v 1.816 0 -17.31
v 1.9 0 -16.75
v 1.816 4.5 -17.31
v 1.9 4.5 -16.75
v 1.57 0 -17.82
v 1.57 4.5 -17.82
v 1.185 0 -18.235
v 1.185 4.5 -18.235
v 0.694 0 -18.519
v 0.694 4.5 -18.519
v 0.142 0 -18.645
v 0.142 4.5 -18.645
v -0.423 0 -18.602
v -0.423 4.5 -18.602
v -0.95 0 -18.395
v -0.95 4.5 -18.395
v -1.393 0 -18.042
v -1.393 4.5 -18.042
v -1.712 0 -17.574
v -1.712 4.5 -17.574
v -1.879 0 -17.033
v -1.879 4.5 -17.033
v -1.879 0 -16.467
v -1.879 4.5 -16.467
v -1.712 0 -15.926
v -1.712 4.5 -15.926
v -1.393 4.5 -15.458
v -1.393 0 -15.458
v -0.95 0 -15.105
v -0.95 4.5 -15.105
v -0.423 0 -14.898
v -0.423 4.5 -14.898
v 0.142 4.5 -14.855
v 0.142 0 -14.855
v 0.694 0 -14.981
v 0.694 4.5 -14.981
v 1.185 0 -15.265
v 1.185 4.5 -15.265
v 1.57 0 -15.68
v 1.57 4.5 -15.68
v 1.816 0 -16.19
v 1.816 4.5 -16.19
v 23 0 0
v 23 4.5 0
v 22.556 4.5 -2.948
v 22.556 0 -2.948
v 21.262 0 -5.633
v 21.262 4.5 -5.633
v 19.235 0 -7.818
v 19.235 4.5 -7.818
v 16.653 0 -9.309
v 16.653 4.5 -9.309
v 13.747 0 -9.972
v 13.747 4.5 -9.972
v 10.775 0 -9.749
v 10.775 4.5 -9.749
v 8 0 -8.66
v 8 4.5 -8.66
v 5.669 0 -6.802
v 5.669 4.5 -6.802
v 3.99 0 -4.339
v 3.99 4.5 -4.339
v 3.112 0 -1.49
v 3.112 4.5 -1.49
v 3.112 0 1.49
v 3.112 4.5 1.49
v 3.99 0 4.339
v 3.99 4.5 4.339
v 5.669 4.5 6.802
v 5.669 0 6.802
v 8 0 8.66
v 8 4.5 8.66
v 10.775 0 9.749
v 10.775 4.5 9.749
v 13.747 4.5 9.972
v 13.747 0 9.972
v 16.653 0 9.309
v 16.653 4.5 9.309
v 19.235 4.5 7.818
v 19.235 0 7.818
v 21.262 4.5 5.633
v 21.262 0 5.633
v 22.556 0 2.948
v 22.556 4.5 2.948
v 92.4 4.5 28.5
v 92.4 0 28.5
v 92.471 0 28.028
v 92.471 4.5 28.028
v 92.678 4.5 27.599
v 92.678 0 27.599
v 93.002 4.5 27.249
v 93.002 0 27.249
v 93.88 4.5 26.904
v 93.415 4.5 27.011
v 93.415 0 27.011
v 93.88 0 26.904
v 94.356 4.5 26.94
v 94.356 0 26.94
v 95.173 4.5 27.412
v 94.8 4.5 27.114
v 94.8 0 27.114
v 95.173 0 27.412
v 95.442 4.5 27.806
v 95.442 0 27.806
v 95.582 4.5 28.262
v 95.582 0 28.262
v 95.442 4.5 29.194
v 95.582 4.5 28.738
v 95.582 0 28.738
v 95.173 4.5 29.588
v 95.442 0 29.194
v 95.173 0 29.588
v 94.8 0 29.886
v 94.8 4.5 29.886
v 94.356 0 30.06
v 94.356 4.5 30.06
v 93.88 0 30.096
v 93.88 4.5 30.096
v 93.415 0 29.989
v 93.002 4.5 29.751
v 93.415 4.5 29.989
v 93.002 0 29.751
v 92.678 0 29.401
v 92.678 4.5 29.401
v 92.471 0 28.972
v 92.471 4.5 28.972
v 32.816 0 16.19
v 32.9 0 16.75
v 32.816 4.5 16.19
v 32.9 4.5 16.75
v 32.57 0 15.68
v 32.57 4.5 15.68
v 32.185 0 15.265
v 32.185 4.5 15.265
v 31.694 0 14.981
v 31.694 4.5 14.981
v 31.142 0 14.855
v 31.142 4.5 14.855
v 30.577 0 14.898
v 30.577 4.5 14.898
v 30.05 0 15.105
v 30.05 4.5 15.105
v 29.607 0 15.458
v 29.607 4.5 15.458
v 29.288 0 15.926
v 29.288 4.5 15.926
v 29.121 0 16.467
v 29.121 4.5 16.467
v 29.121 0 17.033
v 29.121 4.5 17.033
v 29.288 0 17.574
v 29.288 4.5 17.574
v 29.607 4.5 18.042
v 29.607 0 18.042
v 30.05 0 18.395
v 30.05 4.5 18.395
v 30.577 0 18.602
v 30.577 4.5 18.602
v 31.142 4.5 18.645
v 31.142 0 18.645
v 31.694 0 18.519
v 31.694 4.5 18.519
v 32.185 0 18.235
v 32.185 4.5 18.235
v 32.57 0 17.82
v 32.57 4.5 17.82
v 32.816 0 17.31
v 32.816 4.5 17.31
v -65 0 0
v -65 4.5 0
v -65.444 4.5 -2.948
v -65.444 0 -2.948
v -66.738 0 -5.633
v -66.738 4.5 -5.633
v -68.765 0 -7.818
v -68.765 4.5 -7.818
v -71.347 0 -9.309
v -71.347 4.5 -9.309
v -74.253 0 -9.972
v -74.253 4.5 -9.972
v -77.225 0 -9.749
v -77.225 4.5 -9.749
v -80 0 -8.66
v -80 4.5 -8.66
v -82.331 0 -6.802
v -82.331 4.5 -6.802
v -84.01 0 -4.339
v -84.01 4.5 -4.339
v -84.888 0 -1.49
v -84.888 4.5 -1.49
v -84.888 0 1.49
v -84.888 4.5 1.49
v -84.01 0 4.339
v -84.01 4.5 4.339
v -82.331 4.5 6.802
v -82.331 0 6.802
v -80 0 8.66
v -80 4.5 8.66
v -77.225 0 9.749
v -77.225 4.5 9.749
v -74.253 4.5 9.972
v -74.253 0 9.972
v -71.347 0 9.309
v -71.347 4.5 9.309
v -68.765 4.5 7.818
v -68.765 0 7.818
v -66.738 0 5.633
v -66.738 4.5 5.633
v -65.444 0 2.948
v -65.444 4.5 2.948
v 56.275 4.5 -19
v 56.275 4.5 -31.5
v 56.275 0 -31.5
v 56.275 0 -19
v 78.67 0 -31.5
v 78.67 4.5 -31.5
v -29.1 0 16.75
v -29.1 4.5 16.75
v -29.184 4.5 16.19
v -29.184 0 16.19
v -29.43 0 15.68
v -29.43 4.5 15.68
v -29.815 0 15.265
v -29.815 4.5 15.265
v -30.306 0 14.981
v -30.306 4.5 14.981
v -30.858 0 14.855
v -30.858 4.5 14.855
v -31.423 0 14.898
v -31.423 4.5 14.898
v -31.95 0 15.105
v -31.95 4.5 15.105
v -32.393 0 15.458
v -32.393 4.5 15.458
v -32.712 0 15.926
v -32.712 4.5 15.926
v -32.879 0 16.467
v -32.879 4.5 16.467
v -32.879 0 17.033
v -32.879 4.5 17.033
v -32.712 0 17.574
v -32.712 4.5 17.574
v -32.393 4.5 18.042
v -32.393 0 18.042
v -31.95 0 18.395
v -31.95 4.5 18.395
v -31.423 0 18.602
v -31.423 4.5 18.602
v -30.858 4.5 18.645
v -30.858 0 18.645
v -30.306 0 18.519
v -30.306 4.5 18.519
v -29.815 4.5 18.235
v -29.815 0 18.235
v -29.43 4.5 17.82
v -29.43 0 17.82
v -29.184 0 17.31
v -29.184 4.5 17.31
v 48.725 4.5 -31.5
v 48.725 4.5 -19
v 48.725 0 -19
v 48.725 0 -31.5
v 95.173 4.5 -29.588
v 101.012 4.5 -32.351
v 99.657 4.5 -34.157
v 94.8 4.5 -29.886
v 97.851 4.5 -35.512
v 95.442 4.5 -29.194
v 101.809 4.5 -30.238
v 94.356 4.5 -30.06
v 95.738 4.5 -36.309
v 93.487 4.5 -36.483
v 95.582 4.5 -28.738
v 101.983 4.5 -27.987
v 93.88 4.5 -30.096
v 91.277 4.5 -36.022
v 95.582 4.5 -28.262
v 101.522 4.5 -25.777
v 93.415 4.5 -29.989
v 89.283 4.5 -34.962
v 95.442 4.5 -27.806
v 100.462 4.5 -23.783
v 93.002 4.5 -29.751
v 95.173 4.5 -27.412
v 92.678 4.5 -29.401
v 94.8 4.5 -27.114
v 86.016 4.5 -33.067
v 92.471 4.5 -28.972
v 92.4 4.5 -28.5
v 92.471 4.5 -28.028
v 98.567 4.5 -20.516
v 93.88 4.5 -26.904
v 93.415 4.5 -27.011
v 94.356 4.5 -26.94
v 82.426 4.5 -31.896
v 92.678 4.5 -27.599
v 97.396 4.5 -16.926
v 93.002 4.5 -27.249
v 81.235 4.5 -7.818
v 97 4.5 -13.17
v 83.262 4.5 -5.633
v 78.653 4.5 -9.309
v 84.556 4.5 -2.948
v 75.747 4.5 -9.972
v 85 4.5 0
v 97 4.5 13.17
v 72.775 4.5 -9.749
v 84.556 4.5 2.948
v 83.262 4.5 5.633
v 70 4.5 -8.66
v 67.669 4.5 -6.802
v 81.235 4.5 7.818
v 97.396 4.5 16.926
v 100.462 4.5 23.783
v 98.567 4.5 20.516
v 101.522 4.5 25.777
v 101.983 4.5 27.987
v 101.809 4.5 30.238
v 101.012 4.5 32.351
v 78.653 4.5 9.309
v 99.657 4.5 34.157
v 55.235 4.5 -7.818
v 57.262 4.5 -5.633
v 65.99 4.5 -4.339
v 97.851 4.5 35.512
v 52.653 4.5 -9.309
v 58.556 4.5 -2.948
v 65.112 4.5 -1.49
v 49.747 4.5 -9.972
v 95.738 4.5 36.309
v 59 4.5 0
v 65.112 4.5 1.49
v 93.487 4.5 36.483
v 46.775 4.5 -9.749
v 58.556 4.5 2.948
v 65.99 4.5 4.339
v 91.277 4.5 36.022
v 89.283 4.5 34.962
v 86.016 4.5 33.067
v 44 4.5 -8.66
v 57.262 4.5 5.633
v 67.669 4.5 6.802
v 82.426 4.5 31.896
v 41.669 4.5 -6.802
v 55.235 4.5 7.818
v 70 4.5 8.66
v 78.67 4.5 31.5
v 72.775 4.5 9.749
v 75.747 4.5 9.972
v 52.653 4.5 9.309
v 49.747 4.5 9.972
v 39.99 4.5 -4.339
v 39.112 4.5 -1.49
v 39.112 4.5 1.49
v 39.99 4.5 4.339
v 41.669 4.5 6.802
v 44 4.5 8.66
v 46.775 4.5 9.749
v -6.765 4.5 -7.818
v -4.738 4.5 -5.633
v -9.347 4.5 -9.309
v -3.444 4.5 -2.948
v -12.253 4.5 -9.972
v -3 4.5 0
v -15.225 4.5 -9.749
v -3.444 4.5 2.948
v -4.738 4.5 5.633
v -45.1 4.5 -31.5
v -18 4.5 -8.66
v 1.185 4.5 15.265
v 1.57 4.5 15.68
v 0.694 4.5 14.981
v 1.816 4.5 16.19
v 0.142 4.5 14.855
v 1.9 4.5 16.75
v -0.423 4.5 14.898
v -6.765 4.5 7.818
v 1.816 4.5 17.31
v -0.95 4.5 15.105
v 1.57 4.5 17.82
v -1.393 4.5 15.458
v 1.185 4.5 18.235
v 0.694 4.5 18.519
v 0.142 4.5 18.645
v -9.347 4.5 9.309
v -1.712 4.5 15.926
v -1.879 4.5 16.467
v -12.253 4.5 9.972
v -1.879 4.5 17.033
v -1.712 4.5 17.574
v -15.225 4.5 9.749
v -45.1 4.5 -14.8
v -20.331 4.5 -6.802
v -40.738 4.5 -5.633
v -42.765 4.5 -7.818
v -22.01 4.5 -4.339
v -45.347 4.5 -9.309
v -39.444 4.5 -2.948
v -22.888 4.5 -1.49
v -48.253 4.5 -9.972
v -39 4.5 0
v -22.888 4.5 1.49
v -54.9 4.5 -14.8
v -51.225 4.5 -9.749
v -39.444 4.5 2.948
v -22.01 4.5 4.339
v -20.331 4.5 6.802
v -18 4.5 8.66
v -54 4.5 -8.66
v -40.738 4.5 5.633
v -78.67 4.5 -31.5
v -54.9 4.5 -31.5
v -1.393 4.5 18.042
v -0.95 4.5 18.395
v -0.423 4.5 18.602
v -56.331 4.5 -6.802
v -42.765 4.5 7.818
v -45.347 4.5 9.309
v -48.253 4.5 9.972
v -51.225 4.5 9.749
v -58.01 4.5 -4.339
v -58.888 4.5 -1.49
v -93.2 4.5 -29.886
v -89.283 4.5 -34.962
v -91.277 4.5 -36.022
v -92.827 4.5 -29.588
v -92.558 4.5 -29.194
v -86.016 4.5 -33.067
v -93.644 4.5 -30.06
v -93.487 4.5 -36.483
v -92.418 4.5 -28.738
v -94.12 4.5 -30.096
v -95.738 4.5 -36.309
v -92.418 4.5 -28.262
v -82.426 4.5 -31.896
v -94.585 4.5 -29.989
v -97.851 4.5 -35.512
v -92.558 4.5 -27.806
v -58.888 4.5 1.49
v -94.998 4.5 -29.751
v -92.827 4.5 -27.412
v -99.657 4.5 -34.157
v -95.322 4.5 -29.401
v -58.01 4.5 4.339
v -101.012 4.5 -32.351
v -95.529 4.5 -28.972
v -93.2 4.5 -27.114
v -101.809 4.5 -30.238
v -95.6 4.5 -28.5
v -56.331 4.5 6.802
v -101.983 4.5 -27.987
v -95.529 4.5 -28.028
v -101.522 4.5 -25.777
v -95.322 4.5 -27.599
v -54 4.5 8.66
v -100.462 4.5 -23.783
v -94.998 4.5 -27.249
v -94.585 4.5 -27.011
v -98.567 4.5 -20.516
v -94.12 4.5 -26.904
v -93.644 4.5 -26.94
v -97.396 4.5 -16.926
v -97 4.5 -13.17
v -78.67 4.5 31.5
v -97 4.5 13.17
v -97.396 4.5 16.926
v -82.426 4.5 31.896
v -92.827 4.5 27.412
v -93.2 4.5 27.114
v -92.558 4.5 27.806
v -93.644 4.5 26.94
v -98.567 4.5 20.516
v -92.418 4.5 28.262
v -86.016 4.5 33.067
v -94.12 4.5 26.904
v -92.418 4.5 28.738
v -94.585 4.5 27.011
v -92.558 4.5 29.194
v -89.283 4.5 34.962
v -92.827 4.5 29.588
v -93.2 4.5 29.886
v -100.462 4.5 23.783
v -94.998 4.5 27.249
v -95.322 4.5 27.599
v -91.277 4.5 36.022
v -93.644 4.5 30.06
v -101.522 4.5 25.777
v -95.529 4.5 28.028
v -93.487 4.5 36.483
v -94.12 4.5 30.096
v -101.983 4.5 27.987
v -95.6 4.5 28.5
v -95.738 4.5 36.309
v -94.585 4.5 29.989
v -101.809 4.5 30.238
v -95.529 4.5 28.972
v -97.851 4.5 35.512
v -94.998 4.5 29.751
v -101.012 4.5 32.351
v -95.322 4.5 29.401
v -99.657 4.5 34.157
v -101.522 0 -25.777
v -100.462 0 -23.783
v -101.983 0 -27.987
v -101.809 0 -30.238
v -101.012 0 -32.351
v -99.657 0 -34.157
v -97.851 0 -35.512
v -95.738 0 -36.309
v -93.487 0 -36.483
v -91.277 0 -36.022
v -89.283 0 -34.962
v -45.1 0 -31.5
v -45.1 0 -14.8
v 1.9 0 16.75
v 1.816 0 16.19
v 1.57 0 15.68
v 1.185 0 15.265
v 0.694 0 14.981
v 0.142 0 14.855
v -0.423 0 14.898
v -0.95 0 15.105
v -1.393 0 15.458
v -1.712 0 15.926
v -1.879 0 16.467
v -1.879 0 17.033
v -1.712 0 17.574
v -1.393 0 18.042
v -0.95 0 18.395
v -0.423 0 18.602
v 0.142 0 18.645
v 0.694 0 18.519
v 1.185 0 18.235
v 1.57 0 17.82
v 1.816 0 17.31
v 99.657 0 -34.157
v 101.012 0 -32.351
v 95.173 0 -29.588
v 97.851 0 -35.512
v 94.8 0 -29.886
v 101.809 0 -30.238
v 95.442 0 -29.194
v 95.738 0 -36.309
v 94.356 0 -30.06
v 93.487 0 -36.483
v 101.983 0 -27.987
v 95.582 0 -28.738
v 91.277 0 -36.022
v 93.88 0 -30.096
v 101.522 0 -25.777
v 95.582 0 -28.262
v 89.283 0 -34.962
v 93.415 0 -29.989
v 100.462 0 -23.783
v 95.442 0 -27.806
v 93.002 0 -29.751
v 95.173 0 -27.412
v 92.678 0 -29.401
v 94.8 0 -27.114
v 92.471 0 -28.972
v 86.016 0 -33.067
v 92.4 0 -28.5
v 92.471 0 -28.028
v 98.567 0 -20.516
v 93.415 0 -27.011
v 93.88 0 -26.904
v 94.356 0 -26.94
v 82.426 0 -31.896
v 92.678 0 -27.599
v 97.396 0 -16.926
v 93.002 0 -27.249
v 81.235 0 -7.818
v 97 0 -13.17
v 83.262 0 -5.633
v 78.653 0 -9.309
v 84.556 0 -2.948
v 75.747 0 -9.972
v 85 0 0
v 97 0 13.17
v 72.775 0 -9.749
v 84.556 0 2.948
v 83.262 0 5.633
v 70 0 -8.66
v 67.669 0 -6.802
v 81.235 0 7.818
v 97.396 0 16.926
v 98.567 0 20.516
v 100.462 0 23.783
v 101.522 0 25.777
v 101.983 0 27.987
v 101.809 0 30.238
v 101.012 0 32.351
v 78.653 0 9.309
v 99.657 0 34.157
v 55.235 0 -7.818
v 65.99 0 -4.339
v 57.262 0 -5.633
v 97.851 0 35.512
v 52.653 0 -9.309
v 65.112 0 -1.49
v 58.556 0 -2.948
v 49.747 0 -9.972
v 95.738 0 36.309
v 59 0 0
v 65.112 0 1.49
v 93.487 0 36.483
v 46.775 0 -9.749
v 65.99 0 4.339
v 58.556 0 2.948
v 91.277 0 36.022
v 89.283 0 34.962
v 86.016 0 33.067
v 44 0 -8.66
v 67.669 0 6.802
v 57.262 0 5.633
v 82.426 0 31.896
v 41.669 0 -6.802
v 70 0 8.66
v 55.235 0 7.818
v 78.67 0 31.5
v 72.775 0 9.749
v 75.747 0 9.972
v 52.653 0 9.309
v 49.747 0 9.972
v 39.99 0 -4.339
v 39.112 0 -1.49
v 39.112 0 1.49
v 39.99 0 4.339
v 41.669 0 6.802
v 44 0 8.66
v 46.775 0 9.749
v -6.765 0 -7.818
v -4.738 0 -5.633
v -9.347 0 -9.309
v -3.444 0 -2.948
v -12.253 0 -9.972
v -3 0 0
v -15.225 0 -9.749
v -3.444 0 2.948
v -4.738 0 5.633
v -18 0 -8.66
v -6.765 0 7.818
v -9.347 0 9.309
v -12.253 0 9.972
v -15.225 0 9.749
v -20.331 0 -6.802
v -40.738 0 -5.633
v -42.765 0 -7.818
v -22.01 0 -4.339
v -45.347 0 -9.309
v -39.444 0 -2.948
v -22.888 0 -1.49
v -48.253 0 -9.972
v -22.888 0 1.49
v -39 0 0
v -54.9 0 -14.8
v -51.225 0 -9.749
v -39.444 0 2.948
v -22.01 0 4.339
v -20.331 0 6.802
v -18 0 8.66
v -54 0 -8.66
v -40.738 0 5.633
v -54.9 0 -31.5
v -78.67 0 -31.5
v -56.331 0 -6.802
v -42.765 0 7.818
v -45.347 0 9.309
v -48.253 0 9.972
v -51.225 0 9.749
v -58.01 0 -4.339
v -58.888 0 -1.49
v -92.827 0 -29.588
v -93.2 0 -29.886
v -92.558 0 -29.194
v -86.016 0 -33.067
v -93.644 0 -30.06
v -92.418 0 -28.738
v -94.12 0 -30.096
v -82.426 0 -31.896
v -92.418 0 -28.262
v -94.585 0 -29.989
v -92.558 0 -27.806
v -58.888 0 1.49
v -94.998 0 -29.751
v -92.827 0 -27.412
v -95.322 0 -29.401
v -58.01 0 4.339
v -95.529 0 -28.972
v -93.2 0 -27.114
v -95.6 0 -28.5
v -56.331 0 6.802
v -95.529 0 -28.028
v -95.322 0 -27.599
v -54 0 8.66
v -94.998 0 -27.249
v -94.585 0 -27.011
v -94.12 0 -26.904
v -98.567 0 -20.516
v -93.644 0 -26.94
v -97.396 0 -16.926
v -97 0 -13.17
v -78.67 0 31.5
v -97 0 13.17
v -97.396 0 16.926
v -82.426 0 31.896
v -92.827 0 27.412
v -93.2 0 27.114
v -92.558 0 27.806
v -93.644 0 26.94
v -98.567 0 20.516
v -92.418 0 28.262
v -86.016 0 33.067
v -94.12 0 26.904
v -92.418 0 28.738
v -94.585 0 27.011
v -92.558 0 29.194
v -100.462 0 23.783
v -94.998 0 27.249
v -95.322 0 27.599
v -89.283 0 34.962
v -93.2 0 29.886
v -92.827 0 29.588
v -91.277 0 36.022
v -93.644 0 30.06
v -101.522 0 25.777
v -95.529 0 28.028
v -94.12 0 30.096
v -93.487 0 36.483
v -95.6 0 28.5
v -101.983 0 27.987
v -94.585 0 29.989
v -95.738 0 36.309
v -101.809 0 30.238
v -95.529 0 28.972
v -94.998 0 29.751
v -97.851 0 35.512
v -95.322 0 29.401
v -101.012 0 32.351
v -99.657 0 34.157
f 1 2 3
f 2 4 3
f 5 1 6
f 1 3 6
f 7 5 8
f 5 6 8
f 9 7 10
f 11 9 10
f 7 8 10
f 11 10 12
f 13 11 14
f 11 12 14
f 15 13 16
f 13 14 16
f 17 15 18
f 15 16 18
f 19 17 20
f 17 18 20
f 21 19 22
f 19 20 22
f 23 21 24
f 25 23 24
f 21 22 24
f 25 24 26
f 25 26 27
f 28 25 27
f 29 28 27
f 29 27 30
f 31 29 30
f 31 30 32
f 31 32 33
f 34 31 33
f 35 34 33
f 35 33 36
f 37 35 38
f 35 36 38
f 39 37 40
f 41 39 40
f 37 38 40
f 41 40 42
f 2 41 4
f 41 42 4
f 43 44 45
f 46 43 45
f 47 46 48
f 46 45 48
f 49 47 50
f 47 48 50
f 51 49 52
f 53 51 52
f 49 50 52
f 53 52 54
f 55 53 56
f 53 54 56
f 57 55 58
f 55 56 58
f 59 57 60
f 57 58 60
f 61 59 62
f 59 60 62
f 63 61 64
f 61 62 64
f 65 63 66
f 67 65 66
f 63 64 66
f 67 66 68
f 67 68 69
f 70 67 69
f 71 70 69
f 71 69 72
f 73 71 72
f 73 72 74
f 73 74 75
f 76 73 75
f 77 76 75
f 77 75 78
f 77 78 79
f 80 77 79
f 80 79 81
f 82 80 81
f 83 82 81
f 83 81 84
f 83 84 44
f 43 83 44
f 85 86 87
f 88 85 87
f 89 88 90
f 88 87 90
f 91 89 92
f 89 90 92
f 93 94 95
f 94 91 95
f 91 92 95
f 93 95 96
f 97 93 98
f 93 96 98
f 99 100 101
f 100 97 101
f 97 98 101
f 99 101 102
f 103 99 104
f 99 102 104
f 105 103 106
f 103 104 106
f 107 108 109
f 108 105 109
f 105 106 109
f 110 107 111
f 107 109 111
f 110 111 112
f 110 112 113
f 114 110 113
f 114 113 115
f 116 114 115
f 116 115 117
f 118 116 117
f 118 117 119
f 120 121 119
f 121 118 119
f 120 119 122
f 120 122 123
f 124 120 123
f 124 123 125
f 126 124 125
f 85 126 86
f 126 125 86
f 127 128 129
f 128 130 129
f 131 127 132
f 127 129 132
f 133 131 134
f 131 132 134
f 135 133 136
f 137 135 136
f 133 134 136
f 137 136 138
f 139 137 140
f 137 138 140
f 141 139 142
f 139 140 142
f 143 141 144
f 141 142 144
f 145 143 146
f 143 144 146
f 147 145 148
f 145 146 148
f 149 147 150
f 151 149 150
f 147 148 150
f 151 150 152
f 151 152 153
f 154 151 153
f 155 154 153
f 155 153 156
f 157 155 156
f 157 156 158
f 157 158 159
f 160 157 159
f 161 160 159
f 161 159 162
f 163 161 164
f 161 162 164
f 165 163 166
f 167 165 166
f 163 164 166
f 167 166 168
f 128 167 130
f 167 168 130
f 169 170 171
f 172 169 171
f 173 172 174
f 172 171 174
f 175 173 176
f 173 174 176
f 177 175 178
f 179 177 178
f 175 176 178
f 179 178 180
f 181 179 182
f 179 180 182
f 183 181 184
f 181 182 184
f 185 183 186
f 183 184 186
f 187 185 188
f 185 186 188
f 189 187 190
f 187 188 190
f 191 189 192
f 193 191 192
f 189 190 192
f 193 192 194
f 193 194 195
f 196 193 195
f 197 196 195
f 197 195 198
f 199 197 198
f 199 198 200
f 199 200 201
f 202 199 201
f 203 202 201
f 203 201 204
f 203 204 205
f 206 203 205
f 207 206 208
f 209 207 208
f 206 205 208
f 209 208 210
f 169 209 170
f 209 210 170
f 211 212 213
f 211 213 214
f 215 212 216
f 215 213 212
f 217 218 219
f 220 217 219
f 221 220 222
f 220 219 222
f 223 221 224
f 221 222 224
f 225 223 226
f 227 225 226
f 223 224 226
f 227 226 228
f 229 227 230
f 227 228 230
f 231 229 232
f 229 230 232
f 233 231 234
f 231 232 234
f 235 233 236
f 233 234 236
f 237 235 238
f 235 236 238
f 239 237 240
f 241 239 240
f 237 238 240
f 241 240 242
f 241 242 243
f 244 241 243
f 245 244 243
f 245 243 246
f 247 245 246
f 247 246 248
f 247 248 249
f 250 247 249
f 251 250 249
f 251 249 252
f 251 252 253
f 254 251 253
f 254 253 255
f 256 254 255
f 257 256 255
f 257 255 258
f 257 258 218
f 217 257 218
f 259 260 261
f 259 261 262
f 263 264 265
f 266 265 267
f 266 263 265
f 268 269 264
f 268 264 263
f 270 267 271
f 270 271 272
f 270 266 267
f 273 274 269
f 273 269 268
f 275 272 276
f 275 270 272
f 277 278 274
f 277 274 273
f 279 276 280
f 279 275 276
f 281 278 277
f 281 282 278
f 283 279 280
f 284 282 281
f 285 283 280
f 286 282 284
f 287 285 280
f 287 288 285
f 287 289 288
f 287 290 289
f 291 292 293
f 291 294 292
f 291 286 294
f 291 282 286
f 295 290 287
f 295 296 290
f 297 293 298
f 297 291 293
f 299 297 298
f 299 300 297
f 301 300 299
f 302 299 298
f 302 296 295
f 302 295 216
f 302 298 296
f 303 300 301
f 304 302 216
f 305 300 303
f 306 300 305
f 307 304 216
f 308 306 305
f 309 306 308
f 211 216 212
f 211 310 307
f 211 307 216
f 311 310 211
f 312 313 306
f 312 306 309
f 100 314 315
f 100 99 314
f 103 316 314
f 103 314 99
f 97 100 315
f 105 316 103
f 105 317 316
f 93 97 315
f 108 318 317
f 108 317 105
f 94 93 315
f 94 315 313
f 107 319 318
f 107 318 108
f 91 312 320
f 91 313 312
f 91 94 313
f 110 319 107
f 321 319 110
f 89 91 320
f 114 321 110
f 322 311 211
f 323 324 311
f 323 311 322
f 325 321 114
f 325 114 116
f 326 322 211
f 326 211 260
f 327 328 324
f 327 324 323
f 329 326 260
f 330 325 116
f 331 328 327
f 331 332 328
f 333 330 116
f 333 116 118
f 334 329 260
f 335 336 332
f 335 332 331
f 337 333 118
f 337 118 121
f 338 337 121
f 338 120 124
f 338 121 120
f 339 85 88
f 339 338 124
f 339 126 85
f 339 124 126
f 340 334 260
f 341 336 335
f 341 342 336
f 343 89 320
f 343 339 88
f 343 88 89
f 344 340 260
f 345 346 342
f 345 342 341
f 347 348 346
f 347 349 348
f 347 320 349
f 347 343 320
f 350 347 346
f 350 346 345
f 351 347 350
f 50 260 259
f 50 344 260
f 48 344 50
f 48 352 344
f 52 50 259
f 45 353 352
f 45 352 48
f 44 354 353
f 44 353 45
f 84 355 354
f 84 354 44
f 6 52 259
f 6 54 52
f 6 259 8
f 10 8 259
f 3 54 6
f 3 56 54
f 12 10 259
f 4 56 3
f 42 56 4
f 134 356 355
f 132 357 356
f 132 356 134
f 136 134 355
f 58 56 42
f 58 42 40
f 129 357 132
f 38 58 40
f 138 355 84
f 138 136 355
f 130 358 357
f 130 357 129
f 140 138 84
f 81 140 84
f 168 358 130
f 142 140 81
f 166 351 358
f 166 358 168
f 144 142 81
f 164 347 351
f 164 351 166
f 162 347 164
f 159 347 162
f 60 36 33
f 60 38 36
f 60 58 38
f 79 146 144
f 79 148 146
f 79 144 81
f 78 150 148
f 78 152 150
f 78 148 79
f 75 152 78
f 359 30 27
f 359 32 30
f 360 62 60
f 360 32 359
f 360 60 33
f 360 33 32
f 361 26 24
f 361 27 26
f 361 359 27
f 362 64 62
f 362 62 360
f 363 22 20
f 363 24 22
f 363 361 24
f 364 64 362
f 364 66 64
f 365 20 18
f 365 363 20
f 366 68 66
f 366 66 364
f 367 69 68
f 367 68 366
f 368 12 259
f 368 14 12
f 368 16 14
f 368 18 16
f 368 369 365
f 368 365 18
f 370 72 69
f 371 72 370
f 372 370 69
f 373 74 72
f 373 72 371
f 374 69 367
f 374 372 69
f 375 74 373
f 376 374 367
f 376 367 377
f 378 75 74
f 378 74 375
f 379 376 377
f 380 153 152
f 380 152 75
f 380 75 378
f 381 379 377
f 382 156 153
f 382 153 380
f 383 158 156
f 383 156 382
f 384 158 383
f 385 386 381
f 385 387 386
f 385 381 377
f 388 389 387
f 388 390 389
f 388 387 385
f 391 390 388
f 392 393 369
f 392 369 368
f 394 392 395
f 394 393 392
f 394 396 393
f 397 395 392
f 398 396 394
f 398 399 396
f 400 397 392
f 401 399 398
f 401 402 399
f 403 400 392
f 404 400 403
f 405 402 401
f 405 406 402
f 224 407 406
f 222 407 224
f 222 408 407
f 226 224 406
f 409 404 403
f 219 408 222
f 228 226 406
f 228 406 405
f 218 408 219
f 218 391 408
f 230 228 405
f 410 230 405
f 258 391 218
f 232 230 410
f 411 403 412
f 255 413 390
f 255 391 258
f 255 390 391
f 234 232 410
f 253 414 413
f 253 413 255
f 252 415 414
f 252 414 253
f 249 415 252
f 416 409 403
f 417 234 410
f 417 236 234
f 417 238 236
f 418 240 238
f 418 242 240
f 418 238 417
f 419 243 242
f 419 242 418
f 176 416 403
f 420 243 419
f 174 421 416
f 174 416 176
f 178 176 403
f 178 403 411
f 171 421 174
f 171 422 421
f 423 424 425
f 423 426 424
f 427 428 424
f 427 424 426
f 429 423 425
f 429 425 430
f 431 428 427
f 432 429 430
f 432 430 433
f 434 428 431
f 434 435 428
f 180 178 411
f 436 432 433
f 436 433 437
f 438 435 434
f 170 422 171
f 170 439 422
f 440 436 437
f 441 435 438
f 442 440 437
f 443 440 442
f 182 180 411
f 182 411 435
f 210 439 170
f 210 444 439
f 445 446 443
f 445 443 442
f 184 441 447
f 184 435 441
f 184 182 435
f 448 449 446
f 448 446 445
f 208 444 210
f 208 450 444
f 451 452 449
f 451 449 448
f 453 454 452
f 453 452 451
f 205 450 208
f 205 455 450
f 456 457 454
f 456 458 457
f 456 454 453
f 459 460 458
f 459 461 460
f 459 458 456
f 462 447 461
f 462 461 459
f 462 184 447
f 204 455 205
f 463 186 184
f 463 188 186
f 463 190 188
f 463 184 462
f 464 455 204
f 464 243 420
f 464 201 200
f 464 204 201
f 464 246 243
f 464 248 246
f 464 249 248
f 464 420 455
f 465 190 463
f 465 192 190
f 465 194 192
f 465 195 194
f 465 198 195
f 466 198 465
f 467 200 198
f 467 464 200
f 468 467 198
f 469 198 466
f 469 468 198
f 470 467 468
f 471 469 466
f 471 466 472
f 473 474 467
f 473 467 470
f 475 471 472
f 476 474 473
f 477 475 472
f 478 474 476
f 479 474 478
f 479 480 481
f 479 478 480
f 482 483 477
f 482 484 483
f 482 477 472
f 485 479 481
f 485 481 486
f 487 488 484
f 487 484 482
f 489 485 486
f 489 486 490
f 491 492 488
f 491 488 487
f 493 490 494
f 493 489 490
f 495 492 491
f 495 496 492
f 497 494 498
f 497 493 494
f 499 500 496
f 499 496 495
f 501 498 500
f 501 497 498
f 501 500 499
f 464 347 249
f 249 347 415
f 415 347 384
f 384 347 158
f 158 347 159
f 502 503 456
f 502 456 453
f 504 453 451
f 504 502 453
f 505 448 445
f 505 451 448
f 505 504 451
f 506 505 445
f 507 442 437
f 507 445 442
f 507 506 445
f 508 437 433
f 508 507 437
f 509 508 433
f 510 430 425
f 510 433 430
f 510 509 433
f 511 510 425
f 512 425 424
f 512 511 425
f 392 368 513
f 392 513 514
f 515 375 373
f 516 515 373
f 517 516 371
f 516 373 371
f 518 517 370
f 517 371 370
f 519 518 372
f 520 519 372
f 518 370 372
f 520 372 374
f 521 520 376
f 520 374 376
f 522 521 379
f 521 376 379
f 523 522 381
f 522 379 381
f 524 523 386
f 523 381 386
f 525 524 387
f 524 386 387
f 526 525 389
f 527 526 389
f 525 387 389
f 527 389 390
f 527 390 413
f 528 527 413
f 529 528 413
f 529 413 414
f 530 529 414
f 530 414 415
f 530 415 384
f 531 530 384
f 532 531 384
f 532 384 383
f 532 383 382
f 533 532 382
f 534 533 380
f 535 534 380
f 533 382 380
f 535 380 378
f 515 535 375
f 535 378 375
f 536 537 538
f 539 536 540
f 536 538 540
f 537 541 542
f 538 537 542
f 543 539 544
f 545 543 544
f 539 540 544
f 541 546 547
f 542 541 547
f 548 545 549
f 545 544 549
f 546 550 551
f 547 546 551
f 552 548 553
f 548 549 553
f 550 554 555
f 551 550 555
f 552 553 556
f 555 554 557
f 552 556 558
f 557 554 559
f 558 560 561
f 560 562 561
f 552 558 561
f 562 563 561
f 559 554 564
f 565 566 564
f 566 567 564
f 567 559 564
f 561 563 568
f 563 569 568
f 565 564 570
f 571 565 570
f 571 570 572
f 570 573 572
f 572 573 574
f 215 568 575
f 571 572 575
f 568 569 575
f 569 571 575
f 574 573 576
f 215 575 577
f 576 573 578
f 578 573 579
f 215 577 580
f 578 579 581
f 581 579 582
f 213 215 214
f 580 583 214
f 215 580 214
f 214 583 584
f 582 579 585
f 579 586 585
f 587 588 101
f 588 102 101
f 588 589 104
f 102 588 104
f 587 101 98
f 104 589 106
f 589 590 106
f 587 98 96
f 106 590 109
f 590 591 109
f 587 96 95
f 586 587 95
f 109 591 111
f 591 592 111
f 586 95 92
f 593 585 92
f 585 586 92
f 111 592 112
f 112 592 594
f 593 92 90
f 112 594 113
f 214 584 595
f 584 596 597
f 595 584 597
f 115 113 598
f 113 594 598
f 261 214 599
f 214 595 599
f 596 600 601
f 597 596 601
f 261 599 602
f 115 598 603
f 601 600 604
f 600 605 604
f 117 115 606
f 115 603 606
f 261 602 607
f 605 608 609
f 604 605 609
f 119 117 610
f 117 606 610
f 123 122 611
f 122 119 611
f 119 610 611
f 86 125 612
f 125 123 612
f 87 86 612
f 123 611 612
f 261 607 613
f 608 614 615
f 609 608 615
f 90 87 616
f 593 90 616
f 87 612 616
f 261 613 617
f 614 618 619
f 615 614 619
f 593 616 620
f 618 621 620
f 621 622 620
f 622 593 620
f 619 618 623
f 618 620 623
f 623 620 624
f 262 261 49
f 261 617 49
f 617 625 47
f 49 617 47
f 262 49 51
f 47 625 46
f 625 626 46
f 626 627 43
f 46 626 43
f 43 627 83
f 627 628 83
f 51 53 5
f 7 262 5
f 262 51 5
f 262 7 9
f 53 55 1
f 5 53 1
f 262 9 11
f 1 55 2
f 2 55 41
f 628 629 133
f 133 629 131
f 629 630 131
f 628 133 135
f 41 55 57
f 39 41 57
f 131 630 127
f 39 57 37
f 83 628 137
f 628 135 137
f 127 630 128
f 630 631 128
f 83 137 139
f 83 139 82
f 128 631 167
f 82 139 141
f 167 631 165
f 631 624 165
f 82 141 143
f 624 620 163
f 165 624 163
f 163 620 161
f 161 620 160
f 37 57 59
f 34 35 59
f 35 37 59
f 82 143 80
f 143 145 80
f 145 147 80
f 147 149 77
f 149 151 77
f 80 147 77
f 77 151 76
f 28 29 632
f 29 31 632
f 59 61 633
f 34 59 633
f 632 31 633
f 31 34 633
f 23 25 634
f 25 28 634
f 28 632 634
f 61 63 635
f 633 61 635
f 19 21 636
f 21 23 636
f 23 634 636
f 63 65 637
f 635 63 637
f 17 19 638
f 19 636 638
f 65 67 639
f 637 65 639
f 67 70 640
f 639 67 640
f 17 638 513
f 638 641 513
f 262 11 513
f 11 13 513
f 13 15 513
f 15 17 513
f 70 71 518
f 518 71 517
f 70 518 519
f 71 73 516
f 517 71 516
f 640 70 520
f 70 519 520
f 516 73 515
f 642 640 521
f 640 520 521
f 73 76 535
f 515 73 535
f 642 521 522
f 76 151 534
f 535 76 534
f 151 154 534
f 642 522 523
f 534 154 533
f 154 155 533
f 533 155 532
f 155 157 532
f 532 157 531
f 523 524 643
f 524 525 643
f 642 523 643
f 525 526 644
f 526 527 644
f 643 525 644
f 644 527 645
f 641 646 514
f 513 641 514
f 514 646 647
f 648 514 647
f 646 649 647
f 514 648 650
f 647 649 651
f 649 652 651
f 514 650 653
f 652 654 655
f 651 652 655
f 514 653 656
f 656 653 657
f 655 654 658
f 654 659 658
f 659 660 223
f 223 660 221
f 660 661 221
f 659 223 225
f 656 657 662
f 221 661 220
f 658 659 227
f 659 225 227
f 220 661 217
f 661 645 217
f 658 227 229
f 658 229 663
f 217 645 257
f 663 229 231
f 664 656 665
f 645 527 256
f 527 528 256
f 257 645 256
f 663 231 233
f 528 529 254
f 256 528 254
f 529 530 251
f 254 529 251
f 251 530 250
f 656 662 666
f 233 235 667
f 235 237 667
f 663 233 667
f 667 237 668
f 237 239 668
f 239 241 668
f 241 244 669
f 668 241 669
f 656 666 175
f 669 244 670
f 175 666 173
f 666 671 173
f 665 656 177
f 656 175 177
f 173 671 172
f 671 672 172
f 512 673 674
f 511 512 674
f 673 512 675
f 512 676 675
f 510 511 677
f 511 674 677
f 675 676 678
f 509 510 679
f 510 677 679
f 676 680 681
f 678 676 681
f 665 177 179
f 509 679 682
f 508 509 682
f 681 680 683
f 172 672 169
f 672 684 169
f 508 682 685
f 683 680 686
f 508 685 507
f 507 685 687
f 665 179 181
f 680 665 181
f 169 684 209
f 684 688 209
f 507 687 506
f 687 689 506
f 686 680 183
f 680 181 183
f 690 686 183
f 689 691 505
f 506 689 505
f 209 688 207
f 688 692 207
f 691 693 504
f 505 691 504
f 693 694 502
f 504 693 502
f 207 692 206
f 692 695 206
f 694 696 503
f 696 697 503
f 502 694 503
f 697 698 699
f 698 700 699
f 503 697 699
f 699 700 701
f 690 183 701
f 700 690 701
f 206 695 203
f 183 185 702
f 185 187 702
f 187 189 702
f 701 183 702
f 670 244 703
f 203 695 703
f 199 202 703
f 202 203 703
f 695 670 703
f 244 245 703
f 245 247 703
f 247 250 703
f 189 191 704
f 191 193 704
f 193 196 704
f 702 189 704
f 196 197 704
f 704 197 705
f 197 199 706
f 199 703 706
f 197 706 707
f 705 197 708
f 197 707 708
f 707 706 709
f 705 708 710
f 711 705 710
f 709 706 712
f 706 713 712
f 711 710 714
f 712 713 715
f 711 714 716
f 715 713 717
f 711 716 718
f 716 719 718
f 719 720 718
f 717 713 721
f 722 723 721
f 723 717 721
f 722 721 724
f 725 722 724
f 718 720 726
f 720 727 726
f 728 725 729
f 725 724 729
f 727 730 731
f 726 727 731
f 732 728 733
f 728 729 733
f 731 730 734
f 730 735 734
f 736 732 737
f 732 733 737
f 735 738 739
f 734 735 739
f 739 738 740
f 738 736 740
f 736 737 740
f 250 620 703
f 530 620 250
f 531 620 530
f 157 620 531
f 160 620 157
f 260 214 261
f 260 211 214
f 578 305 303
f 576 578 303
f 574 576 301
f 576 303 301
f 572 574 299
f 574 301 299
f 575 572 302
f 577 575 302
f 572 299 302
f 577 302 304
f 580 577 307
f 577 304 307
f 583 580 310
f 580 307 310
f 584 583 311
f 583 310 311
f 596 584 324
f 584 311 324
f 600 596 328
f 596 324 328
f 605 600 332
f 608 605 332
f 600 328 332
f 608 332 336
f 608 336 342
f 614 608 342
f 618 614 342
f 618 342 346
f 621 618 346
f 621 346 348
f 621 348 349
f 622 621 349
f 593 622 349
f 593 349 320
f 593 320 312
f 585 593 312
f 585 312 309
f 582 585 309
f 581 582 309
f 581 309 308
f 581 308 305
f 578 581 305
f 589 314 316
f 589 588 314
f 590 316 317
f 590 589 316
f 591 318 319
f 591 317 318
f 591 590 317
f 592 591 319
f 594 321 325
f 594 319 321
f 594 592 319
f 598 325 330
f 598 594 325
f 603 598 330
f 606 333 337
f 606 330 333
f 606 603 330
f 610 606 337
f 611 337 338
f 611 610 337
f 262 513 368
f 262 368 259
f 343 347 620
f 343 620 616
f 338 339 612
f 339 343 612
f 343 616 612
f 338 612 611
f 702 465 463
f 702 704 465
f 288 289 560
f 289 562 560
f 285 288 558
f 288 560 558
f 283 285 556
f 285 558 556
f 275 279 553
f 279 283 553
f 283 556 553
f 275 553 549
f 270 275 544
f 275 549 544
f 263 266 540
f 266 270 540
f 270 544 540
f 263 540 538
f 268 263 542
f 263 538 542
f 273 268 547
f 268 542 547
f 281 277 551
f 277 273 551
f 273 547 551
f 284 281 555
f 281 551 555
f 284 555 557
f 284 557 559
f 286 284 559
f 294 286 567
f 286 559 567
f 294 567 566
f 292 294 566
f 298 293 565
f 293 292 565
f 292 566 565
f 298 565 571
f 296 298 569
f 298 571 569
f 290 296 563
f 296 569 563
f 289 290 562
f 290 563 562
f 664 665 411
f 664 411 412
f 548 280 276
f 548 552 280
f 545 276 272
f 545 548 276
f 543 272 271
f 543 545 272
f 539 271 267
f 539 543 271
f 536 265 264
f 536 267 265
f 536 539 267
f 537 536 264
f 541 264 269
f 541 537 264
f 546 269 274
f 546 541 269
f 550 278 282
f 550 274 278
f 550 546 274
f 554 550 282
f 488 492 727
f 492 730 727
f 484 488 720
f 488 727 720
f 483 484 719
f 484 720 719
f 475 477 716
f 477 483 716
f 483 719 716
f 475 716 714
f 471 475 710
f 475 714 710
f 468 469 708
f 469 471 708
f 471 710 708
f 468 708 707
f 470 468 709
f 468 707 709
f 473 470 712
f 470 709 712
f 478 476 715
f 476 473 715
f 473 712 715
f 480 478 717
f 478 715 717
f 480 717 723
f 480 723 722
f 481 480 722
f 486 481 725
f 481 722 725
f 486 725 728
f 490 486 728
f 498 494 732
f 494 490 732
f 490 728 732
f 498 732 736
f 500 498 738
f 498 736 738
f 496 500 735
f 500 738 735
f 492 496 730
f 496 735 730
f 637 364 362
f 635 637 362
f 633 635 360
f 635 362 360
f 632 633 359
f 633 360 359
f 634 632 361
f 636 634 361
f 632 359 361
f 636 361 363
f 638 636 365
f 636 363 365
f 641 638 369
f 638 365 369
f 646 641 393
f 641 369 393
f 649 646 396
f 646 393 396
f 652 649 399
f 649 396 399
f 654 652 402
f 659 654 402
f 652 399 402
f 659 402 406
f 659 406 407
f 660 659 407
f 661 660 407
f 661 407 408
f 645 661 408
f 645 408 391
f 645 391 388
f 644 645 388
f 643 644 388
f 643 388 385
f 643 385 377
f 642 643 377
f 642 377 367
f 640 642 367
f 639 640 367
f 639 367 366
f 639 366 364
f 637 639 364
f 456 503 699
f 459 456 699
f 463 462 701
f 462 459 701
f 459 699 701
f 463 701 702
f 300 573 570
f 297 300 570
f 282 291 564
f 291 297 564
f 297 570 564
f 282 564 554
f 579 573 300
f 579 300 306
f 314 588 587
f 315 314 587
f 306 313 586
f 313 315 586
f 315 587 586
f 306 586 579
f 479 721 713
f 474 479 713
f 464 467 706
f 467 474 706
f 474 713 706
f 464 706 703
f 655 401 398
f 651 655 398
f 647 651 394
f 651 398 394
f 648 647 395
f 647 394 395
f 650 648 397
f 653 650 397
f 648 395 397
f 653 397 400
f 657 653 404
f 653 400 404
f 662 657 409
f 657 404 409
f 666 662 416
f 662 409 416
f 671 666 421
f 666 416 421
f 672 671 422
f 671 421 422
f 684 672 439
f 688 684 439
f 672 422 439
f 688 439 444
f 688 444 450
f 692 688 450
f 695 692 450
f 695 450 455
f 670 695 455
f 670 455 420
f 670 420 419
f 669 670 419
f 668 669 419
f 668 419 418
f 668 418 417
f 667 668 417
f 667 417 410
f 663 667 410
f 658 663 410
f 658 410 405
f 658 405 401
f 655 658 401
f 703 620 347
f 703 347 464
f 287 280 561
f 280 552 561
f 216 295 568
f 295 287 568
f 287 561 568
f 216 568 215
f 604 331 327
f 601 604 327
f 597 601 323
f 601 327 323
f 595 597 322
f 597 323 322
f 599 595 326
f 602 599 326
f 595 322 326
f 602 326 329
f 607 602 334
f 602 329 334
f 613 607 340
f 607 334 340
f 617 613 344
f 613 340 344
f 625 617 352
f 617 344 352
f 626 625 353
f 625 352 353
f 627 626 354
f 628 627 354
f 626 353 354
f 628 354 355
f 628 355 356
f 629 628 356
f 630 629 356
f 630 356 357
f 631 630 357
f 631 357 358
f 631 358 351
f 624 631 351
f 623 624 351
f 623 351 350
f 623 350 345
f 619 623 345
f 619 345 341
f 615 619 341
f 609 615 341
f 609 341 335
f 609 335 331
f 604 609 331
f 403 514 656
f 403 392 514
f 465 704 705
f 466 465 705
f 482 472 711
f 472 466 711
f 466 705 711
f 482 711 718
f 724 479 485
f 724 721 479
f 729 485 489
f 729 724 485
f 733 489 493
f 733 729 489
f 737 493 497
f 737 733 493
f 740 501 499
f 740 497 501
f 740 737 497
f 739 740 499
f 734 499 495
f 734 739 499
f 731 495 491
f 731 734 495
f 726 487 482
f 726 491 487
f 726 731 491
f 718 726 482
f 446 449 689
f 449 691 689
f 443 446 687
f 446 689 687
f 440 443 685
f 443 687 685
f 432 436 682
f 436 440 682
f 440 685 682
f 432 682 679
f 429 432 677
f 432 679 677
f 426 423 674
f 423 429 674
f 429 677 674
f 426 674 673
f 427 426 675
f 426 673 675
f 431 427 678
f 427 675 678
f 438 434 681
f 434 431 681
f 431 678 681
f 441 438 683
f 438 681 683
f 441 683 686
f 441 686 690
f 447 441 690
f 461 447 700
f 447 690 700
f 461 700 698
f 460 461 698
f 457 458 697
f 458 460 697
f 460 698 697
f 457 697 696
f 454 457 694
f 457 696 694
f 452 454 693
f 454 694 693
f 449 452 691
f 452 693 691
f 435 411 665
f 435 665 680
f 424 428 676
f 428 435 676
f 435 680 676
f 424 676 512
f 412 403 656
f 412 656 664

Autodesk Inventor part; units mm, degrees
ref_plane "YZ Plane" through (0, 0, 0) normal (1, 0, 0) x (0, 1, 0)
ref_plane "XZ Plane" through (0, 0, 0) normal (0, 1, 0) x (-1, 0, 0)
ref_plane "XY Plane" through (0, 0, 0) normal (0, 0, 1) x (1, 0, 0)
sketch "Sketch2" plane through (0, 0, 0) normal (0, 1, 0) x (-1, 0, 0)
  line L0 (-94, 28.5) -> (94, 28.5) construction
  line L1 (94, 28.5) -> (94, -28.5) construction
  line L2 (94, -28.5) -> (-94, -28.5) construction
  line L3 (-94, -28.5) -> (-94, 28.5) construction
  line L4 (-94, 28.5) -> (94, -28.5) construction
  line L5 (94, 28.5) -> (-94, -28.5) construction
  line L6 (78.6703, -31.5) -> (-78.6703, -31.5)
  line L7 (-97, -13.1703) -> (-97, 13.1703)
  line L8 (-78.6703, 31.5) -> (78.6703, 31.5)
  line L9 (97, 13.1703) -> (97, -13.1703)
  arc A0 (89.2832, -34.9615) -> (100.4615, -23.7832) centre (94, -28.5) ccw
  arc A1 (100.4615, 23.7832) -> (89.2832, 34.9615) centre (94, 28.5) ccw
  arc A2 (-89.2832, 34.9615) -> (-100.4615, 23.7832) centre (-94, 28.5) ccw
  arc A3 (-100.4615, -23.7832) -> (-89.2832, -34.9615) centre (-94, -28.5) ccw
  arc A4 (89.2832, -34.9615) -> (78.6703, -31.5) centre (78.6703, -49.5) ccw
  arc A5 (97, -13.1703) -> (100.4615, -23.7832) centre (115, -13.1703) ccw
  arc A6 (100.4615, 23.7832) -> (97, 13.1703) centre (115, 13.1703) ccw
  arc A7 (78.6703, 31.5) -> (89.2832, 34.9615) centre (78.6703, 49.5) ccw
  arc A8 (-89.2832, 34.9615) -> (-78.6703, 31.5) centre (-78.6703, 49.5) ccw
  arc A9 (-97, 13.1703) -> (-100.4615, 23.7832) centre (-115, 13.1703) ccw
  arc A10 (-100.4615, -23.7832) -> (-97, -13.1703) centre (-115, -13.1703) ccw
  arc A11 (-78.6703, -31.5) -> (-89.2832, -34.9615) centre (-78.6703, -49.5) ccw
  circle A12 centre (94, -28.5) radius 1.6
  circle A13 centre (94, 28.5) radius 1.6
  circle A14 centre (-94, -28.5) radius 1.6
  circle A15 centre (-94, 28.5) radius 1.6
  circle A16 centre (94, -28.5) radius 3 construction
  circle A17 centre (94, 28.5) radius 3 construction
  circle A18 centre (-94, 28.5) radius 3 construction
  circle A19 centre (-94, -28.5) radius 3 construction
  point P0 (0, 0)
  point P1 (86.5838, -31.5)
  point P2 (-86.5838, -31.5)
  point P3 (-97, -21.0838)
  point P4 (-97, 21.0838)
  point P5 (-86.5838, 31.5)
  point P6 (86.5838, 31.5)
  point P7 (97, 21.0838)
  point P8 (97, -21.0838)
  dimension "d6" = 3
  dimension "d7" = 3
  dimension "d8" = 3
  dimension "d9" = 3
  dimension "d10" = 8
  dimension "d11" = 18
  dimension "d14" = 3.2
  dimension "d15" = 63
  dimension "d16" = 194
  dimension "d17" = 6
extrude "Extrusion1" add sketch "Sketch2" along normal blind 4.5
sketch "Sketch4" plane through (0, 4.5, 0) normal (0, 1, 0) x (1, 0, 0)
  circle A0 centre (-13, 0) radius 10
  circle A1 centre (13, 0) radius 10
  circle A2 centre (-75, 0) radius 10
  circle A3 centre (-49, 0) radius 10
  circle A4 centre (49, 0) radius 10
  circle A5 centre (75, 0) radius 10
  circle A6 centre (-31, -16.75) radius 1.9
  circle A7 centre (0, -16.75) radius 1.9
  circle A8 centre (31, -16.75) radius 1.9
  circle A9 centre (0, 16.75) radius 1.9
  point P0 (0, 0)
  dimension "d23" = 26
  dimension "d24" = 13
  dimension "d25" = 20
  dimension "d26" = 36
  dimension "d27" = 26
  dimension "d28" = 36
  dimension "d29" = 26
  dimension "d32" = 31
  dimension "d33" = 31
  dimension "d34" = 16.75
  dimension "d35" = 16.75
  dimension "d36" = 3.8
extrude "Extrusion3" cut sketch "Sketch4" against normal through all
sketch "Sketch5" plane through (0, 4.5, 0) normal (0, 1, 0) x (1, 0, 0)
  line L0 (78.6703, 31.5) -> (-78.6703, 31.5) projected
  line L1 (-54.9, 31.5) -> (-45.1, 31.5)
  line L2 (-45.1, 31.5) -> (-45.1, 14.8)
  line L3 (-45.1, 14.8) -> (-54.9, 14.8)
  line L4 (-54.9, 14.8) -> (-54.9, 31.5)
  line L5 (48.725, 31.5) -> (56.275, 31.5)
  line L6 (56.275, 31.5) -> (56.275, 19)
  line L7 (56.275, 19) -> (48.725, 19)
  line L8 (48.725, 19) -> (48.725, 31.5)
  point P0 (0, 0)
  point P1 (-50, 31.5)
  point P2 (52.5, 31.5)
  dimension "d37" = 50
  dimension "d38" = 52.5
  dimension "d39" = 9.8
  dimension "d40" = 7.55
  dimension "d41" = 12.5
  dimension "d42" = 16.7
extrude "Extrusion4" cut sketch "Sketch5" against normal through all
equation "\"d7\" = d6"
equation "\"d8\" = d6"
equation "\"d9\" = d8"
equation "\"d24\" = 0.5 * d23"
equation "\"d27\" = d23"
equation "\"d28\" = d26"
equation "\"d29\" = d23"
equation "\"d33\" = d32"
equation "\"d35\" = d34"
properties part number "Top"
